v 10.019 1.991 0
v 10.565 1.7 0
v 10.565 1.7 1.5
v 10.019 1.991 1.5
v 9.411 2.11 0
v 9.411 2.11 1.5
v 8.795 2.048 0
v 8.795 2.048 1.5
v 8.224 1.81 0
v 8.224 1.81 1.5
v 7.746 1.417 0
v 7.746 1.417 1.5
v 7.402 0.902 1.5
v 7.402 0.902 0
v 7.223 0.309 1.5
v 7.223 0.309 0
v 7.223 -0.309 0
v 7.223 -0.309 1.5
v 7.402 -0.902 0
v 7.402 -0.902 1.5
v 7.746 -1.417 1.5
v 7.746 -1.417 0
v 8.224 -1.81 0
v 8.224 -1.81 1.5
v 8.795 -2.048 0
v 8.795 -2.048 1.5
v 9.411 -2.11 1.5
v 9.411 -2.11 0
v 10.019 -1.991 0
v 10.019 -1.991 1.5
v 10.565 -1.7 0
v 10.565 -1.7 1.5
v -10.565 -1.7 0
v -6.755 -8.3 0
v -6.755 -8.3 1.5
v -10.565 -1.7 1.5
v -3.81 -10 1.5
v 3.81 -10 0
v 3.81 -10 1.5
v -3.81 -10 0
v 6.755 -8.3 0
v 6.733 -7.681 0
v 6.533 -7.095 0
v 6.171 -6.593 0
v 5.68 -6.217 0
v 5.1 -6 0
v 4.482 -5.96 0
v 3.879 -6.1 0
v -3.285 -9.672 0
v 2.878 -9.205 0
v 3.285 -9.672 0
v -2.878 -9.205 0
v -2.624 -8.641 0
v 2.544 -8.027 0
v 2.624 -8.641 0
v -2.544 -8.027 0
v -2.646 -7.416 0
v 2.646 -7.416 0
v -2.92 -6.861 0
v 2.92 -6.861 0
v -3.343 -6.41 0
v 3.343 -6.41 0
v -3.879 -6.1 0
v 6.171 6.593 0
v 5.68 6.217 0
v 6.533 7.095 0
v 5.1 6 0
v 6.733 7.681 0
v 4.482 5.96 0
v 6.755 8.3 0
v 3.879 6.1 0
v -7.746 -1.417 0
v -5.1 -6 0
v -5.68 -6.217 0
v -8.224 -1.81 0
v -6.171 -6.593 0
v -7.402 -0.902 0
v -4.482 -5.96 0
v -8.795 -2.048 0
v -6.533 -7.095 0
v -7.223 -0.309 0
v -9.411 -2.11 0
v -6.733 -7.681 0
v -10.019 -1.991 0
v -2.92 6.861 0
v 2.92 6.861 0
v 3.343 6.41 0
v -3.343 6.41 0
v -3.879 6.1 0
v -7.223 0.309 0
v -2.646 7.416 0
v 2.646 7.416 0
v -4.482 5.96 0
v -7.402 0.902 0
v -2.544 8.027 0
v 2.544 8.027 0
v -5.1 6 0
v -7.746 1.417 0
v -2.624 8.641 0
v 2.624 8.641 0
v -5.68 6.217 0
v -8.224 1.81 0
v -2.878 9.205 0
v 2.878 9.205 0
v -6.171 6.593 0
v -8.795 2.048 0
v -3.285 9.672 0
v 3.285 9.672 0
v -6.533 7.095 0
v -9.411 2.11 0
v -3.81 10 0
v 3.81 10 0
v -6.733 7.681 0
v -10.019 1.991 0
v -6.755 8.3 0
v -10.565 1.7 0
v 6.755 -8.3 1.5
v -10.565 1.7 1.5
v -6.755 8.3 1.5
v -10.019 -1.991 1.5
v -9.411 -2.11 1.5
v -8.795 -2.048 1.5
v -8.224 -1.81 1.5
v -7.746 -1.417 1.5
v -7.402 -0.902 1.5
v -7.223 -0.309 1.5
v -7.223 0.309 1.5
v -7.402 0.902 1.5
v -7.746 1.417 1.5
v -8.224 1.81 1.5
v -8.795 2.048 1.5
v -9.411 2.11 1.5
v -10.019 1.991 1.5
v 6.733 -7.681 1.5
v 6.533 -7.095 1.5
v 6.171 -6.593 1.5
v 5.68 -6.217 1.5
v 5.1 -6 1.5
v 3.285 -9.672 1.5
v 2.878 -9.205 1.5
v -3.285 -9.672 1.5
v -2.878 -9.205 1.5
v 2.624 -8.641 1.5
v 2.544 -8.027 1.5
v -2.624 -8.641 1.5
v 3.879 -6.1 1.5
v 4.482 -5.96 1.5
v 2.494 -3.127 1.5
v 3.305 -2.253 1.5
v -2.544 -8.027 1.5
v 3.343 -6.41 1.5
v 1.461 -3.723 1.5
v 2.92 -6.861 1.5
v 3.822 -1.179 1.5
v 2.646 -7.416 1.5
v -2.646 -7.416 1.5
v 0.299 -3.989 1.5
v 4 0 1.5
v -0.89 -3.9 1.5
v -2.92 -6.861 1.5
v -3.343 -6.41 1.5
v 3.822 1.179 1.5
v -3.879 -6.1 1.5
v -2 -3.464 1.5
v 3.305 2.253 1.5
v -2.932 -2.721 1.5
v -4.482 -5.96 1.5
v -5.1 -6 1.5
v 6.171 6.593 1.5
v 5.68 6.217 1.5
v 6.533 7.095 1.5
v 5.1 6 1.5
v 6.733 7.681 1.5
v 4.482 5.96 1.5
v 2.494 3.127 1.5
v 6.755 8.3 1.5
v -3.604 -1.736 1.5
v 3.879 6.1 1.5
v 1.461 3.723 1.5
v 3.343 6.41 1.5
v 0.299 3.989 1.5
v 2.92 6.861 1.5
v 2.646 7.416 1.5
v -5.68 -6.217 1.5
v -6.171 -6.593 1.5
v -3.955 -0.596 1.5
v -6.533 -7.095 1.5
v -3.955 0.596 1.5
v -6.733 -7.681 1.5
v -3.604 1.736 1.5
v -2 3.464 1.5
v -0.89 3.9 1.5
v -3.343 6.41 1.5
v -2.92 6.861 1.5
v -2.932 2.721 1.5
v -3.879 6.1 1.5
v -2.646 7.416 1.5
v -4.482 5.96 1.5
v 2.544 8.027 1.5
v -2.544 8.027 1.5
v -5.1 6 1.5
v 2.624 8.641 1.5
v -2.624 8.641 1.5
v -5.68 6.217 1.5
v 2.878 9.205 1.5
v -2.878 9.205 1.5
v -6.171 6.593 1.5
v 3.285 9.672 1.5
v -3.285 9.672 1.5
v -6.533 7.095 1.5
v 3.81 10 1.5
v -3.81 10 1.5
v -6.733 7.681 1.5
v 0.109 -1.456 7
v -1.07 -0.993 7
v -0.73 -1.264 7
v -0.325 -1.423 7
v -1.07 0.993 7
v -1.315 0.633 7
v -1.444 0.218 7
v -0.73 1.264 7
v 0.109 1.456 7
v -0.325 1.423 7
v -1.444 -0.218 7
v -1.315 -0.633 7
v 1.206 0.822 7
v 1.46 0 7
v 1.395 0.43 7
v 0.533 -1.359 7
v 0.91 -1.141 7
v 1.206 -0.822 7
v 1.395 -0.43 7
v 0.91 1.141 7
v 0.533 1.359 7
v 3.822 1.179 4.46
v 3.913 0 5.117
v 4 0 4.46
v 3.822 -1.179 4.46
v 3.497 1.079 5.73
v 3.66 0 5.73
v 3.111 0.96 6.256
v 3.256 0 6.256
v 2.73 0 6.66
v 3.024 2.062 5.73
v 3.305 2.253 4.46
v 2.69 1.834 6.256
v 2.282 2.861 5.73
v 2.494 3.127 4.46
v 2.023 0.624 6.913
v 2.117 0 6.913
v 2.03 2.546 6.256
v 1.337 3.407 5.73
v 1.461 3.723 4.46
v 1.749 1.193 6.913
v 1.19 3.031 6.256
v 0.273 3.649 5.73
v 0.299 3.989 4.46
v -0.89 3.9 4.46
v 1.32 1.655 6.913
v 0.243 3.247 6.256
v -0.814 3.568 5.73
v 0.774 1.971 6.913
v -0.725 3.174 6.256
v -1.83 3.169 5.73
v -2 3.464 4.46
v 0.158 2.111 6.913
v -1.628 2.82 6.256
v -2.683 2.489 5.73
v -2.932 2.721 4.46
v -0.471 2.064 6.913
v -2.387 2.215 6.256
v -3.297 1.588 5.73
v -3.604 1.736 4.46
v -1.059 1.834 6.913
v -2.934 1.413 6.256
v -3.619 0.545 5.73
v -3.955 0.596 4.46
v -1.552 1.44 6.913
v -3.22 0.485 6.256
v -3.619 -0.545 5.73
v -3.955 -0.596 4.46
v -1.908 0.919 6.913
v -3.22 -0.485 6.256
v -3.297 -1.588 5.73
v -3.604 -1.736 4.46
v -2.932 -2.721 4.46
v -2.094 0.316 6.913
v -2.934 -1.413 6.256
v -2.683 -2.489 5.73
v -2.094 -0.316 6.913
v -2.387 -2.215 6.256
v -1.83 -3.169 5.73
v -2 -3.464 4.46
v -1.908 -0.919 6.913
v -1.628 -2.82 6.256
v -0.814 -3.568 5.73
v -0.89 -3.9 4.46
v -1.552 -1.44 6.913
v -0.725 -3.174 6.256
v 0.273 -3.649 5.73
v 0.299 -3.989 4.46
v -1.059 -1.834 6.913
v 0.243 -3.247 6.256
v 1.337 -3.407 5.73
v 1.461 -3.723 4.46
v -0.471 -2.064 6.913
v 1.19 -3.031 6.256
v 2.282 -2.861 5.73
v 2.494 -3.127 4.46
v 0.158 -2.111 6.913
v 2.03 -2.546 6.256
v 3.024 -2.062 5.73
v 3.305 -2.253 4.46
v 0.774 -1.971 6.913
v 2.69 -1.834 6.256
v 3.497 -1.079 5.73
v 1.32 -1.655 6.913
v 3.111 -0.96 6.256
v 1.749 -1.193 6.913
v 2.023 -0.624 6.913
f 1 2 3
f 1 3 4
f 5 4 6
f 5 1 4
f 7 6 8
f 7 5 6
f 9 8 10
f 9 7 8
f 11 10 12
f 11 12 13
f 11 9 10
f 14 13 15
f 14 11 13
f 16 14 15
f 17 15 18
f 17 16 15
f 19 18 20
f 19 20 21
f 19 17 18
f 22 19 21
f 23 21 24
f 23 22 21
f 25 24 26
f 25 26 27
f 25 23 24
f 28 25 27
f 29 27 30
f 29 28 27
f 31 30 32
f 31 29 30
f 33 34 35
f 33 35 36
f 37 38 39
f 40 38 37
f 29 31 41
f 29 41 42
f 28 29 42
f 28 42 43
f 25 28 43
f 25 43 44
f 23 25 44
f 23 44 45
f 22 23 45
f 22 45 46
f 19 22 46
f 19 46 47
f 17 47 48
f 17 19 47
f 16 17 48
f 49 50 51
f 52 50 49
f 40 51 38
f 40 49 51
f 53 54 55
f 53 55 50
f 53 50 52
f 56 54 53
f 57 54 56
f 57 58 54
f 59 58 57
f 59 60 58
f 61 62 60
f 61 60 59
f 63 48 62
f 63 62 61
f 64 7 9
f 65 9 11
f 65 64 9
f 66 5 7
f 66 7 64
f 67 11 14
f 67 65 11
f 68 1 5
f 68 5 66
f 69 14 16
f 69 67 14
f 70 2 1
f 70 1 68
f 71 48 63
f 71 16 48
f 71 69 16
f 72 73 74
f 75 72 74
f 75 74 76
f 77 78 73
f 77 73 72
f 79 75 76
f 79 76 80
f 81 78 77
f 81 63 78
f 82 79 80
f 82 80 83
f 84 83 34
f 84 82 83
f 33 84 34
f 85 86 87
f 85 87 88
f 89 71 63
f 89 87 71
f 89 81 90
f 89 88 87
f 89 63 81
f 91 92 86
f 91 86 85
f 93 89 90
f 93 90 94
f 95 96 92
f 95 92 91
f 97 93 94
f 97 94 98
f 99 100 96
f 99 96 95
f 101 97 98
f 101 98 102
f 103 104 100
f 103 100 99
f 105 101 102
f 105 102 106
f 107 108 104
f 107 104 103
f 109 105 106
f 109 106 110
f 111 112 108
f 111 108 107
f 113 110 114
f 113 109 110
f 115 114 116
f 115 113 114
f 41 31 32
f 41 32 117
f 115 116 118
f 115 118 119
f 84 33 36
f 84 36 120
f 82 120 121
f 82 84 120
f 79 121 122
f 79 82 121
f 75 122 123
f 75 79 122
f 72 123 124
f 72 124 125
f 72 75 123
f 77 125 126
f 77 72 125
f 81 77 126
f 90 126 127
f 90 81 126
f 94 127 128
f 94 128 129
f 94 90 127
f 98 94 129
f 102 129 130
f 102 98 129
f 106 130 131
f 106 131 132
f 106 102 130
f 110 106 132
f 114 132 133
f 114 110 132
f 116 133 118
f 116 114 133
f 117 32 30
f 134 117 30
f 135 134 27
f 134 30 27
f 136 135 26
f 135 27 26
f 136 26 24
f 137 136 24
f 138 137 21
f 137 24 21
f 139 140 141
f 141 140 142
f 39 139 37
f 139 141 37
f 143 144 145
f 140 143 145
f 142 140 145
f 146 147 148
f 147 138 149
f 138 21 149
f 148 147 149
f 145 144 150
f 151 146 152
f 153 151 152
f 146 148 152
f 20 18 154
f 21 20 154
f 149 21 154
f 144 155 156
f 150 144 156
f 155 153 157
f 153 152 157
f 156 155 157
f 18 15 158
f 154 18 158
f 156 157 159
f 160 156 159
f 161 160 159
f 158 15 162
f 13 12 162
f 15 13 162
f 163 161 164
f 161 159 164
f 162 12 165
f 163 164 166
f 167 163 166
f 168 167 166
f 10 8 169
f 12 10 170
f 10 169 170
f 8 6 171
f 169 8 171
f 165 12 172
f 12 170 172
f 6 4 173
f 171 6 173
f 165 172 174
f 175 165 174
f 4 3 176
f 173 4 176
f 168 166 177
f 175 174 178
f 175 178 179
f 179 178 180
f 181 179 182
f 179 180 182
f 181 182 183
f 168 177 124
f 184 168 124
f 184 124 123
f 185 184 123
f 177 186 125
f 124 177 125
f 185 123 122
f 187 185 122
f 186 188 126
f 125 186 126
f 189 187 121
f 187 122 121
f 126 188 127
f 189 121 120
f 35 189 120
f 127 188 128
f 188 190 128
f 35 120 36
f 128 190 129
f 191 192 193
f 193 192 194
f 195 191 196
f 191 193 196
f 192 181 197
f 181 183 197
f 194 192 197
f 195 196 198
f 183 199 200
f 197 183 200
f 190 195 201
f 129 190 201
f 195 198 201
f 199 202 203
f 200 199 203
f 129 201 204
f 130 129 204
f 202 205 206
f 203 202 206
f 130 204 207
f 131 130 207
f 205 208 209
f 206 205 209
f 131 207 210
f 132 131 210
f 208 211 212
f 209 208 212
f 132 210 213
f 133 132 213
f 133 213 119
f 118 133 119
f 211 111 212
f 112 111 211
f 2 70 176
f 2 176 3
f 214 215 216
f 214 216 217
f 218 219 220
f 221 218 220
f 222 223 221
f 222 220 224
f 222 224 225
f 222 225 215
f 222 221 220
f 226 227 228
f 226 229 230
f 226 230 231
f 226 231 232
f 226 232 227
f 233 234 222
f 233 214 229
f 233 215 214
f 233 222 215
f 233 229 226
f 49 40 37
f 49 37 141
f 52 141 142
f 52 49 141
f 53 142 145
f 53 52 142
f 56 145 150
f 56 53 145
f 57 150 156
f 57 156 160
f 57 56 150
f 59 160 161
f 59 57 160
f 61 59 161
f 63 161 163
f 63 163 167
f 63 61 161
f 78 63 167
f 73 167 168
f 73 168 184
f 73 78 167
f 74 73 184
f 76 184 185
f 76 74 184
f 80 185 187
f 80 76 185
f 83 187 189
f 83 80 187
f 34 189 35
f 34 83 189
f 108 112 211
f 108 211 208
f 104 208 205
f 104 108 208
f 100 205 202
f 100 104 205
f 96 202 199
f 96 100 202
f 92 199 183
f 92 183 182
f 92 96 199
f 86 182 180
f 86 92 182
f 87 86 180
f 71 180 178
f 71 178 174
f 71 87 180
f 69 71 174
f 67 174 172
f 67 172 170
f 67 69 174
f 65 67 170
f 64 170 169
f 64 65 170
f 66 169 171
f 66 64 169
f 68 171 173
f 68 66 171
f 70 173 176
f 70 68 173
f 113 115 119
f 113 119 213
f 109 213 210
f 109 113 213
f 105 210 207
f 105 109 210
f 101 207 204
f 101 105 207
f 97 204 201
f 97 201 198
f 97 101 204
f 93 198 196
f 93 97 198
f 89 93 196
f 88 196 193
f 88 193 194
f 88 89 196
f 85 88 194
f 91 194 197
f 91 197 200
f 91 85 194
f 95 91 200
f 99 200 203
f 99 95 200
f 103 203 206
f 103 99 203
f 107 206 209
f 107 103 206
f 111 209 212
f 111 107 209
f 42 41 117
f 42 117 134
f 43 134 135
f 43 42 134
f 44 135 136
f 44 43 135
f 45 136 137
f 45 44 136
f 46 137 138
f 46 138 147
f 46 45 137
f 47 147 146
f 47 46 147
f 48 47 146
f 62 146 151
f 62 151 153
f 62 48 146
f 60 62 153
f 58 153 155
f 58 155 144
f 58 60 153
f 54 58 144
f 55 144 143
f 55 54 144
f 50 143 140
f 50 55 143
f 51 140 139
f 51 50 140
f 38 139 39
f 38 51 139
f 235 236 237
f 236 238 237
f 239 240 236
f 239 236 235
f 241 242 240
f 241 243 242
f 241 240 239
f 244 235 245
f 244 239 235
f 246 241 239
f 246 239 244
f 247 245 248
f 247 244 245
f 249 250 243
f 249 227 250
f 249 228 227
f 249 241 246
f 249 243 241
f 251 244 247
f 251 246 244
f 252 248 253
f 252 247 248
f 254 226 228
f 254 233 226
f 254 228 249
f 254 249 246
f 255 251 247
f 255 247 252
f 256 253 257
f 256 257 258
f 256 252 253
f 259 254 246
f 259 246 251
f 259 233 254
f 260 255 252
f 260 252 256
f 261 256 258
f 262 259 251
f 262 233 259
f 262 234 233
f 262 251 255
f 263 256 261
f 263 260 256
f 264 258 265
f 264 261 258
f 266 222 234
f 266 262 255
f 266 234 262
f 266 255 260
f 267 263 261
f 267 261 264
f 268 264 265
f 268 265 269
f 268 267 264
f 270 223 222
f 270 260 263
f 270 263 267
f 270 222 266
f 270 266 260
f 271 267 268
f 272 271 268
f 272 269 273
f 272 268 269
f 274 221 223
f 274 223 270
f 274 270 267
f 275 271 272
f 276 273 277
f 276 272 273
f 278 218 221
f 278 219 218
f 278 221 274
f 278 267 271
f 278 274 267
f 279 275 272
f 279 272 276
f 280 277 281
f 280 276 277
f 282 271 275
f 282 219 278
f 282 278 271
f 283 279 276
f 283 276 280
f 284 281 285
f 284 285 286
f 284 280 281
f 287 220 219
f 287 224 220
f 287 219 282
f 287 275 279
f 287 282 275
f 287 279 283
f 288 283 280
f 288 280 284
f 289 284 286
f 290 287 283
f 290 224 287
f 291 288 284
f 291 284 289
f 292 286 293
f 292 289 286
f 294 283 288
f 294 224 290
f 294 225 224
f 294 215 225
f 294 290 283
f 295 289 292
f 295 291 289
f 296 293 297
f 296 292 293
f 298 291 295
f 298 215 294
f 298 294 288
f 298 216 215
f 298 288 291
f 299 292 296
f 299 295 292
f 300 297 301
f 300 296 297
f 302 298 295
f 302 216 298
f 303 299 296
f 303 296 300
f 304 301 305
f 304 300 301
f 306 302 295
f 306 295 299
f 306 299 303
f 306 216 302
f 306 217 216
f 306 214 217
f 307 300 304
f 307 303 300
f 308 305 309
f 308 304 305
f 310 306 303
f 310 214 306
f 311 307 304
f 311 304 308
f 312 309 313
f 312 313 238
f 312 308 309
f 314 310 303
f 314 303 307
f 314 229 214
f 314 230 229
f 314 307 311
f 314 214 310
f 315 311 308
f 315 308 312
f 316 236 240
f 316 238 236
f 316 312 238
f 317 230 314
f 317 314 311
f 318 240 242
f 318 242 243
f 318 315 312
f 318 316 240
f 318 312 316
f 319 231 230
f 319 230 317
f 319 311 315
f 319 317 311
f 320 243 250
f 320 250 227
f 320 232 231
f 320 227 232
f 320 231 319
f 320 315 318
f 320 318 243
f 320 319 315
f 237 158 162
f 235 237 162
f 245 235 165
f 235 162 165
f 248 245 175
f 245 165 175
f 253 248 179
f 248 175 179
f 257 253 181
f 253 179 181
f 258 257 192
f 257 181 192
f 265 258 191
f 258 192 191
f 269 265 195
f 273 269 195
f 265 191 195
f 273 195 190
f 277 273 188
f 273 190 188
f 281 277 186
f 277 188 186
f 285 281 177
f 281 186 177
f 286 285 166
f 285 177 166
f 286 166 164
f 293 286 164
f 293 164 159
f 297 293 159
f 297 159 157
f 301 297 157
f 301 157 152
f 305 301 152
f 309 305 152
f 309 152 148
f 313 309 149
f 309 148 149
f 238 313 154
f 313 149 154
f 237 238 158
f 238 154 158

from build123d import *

# Parameters (mm, degrees)
BOSS_EXTRUDE1_DEPTH = 1.5
SKETCH2_R           = 4
BOSS_EXTRUDE2_DEPTH = 5.5
FILLET1_R           = 2.54


with BuildPart() as part:
    # Sketch1 → Boss-Extrude1 (new body)
    with BuildSketch(Plane.XY):
        with BuildLine():
            Line((-3.81, 10), (3.81, 10))
            ThreePointArc((3.81, 10), (3.6, 6.235382907), (6.755254038, 8.299556788))
            Line((6.755254038, 8.299556788), (10.565254038, 1.700443212))
            ThreePointArc((10.565254038, 1.700443212), (7.2, 0), (10.565254038, -1.700443212))
            Line((10.565254038, -1.700443212), (6.755254038, -8.299556788))
            ThreePointArc((6.755254038, -8.299556788), (3.6, -6.235382907), (3.81, -10))
            Line((3.81, -10), (-3.81, -10))
            ThreePointArc((-3.81, -10), (-3.6, -6.235382907), (-6.755254038, -8.299556788))
            Line((-6.755254038, -8.299556788), (-10.565254038, -1.700443212))
            ThreePointArc((-10.565254038, -1.700443212), (-7.2, 0), (-10.565254038, 1.700443212))
            Line((-10.565254038, 1.700443212), (-6.755254038, 8.299556788))
            ThreePointArc((-6.755254038, 8.299556788), (-3.6, 6.235382907), (-3.81, 10))
        make_face()
    extrude(amount=BOSS_EXTRUDE1_DEPTH)

    # Sketch2 → Boss-Extrude2 (add)
    with BuildSketch(Plane.XY.offset(1.5)):
        Circle(SKETCH2_R)
    extrude(amount=BOSS_EXTRUDE2_DEPTH)

    # Fillet1
    fillet1_edges = [part.edges().sort_by_distance(p)[0] for p in [
        (-4, 0, 7),
    ]]
    fillet(fillet1_edges, radius=FILLET1_R)


solid = part.part
